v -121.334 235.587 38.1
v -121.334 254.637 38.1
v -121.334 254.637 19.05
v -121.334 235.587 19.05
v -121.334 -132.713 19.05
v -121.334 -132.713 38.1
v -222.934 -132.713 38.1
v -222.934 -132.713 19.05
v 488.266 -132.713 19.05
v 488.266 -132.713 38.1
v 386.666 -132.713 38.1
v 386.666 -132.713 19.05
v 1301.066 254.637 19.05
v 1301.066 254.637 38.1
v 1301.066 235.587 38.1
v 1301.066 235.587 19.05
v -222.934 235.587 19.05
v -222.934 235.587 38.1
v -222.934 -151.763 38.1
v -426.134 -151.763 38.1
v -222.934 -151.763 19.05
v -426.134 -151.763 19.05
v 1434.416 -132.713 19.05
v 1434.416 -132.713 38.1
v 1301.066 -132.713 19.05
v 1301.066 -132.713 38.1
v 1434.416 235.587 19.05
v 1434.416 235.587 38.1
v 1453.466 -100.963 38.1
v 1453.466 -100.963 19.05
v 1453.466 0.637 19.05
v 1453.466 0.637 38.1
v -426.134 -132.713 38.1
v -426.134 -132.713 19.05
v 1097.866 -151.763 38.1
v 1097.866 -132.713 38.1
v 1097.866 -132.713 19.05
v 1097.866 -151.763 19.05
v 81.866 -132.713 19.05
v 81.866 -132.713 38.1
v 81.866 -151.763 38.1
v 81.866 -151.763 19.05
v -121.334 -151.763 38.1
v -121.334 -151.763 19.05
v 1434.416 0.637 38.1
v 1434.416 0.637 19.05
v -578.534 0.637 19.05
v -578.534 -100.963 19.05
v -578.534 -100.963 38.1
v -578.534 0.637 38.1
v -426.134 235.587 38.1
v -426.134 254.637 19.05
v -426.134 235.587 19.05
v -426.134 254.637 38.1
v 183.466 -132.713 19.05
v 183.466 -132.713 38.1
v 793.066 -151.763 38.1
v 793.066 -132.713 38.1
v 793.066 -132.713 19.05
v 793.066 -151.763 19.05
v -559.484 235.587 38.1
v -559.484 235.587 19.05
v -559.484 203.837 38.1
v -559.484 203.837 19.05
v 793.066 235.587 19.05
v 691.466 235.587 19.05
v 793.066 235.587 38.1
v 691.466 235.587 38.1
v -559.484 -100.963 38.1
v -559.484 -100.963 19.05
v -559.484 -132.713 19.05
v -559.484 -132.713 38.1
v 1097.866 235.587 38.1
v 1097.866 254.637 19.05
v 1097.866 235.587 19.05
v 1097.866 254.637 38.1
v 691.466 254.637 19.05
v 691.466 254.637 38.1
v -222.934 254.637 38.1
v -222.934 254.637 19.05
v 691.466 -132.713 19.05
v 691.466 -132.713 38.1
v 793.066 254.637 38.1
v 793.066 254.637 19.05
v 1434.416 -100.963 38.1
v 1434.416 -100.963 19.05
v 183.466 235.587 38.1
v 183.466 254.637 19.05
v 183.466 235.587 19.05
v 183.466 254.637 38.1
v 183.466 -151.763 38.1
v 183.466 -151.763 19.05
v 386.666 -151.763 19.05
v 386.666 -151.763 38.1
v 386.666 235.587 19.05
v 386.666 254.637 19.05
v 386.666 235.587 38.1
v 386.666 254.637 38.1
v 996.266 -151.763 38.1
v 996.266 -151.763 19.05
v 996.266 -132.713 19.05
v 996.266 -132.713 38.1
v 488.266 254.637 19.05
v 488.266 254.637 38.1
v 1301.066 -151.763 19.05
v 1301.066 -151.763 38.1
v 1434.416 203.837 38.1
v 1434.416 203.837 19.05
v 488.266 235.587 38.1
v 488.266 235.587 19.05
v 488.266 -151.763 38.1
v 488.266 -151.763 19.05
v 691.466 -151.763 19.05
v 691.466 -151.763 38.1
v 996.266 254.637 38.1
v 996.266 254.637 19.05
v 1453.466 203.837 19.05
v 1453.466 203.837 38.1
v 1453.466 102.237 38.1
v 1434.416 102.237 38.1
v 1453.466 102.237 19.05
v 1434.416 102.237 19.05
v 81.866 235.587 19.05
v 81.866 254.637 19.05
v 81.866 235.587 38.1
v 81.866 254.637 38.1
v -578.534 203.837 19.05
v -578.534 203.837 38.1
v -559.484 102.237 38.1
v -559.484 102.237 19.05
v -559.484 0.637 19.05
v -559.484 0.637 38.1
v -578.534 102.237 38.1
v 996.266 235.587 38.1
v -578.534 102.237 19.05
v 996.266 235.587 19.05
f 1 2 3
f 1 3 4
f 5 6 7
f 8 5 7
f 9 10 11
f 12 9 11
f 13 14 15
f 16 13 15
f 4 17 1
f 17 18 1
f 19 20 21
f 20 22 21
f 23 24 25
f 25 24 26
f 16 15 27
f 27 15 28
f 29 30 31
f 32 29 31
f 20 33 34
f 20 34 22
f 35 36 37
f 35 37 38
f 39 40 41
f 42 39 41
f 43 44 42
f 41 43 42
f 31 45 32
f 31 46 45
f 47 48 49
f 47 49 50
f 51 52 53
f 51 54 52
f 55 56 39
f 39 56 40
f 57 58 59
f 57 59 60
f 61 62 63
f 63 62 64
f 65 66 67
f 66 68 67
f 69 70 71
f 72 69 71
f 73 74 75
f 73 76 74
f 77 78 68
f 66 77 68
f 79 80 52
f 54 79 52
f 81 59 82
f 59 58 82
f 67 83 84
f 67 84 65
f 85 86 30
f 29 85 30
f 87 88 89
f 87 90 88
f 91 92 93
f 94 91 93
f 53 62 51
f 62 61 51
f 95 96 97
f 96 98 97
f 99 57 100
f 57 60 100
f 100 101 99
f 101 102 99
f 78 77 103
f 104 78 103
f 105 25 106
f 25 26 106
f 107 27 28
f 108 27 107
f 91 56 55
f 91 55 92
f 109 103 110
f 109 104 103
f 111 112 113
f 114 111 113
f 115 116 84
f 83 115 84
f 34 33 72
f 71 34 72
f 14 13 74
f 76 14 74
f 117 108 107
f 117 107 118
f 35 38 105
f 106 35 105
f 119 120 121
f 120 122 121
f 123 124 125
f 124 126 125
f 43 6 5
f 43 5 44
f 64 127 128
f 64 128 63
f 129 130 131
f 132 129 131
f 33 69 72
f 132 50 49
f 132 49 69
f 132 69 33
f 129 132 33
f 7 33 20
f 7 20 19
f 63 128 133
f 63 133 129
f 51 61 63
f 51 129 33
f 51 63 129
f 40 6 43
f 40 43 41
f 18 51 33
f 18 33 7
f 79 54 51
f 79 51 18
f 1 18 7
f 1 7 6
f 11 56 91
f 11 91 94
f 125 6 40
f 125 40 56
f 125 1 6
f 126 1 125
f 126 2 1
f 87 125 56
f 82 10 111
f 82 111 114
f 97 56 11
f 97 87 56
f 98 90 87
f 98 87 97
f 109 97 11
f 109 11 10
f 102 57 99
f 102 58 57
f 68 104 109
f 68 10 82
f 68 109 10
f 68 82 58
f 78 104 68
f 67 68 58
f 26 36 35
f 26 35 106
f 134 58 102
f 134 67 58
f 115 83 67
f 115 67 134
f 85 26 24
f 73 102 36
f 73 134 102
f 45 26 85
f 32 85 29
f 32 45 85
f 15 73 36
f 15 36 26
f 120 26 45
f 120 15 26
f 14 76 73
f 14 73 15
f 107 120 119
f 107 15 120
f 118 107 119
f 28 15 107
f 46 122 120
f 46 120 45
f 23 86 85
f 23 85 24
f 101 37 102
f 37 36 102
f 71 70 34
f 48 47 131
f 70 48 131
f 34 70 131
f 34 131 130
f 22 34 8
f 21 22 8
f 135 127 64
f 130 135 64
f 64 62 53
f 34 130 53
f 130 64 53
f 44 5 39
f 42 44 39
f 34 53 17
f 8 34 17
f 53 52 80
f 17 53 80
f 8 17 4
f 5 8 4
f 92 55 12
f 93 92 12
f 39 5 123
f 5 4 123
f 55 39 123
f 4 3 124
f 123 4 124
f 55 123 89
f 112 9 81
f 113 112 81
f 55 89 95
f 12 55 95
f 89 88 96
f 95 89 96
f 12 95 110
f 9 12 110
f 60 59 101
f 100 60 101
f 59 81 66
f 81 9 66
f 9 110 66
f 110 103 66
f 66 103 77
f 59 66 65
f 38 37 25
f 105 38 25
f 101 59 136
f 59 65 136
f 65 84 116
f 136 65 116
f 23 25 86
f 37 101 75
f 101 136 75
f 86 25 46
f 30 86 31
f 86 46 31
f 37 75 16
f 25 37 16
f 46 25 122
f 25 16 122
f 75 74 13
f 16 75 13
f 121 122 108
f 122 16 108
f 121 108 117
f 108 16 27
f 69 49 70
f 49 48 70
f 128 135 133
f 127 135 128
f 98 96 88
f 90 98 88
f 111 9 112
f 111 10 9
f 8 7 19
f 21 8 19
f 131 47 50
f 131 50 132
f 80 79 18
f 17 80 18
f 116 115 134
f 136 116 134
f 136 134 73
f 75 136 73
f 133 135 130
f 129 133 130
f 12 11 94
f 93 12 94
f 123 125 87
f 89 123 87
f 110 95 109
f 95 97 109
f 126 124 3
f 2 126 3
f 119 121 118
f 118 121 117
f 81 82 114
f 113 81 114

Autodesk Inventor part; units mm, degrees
ref_plane "YZ Plane" through (0, 0, 0) normal (1, 0, 0) x (0, 1, 0)
ref_plane "XZ Plane" through (0, 0, 0) normal (0, 1, 0) x (-1, 0, 0)
ref_plane "XY Plane" through (0, 0, 0) normal (0, 0, 1) x (1, 0, 0)
ref_plane "Work Plane1" through (0, 0, 19.05) normal (0, 0, 1) x (1, 0, 0)
sketch "Sketch2" plane through (0, 0, 19.05) normal (0, 0, 1) x (1, 0, 0)
  line L0 (1453.4656, 254.6366) -> (-578.5344, 254.6366) projected
  line L1 (-578.5344, 254.6366) -> (-559.4844, 254.6366)
  line L2 (-559.4844, -151.7634) -> (-578.5344, -151.7634)
  line L3 (-578.5344, -151.7634) -> (-578.5344, 254.6366)
  line L4 (1453.4656, -151.7634) -> (1453.4656, 254.6366) projected
  line L5 (-578.5344, -151.7634) -> (1453.4656, -151.7634) projected
  line L6 (1453.4656, 254.6366) -> (1434.4156, 254.6366)
  line L7 (1434.4156, -151.7634) -> (1453.4656, -151.7634)
  line L8 (1453.4656, -151.7634) -> (1453.4656, 254.6366)
  line L9 (-578.5344, 254.6366) -> (-578.5344, -151.7634) projected
  line L10 (-559.4844, 254.6366) -> (-559.4844, 203.8366)
  line L11 (-578.5344, 203.8366) -> (-559.4844, 203.8366)
  line L12 (1434.4156, 203.8366) -> (1453.4656, 203.8366)
  line L13 (-578.5344, 102.2366) -> (-559.4844, 102.2366)
  line L14 (1434.4156, 102.2366) -> (1453.4656, 102.2366)
  line L15 (-578.5344, 0.6366) -> (-559.4844, 0.6366)
  line L16 (1434.4156, 0.6366) -> (1453.4656, 0.6366)
  line L17 (-578.5344, -100.9634) -> (-559.4844, -100.9634)
  line L18 (1434.4156, -100.9634) -> (1453.4656, -100.9634)
  line L19 (-559.4844, 102.2366) -> (-559.4844, 0.6366)
  line L20 (-559.4844, -100.9634) -> (-559.4844, -151.7634)
  line L21 (1434.4156, 254.6366) -> (1434.4156, 203.8366)
  line L22 (1434.4156, 102.2366) -> (1434.4156, 0.6366)
  line L23 (1434.4156, -100.9634) -> (1434.4156, -151.7634)
  line L24 (-578.5344, 254.6366) -> (-559.4844, 254.6366)
  line L25 (-559.4844, 254.6366) -> (-559.4844, 203.8366)
  line L26 (-559.4844, 203.8366) -> (-578.5344, 203.8366)
  line L27 (-578.5344, 203.8366) -> (-578.5344, 254.6366)
  line L28 (-578.5344, 102.2366) -> (-559.4844, 102.2366)
  line L29 (-559.4844, 102.2366) -> (-559.4844, 0.6366)
  line L30 (-559.4844, 0.6366) -> (-578.5344, 0.6366)
  line L31 (-578.5344, 0.6366) -> (-578.5344, 102.2366)
  line L32 (-578.5344, -100.9634) -> (-559.4844, -100.9634)
  line L33 (-559.4844, -100.9634) -> (-559.4844, -151.7634)
  line L34 (-559.4844, -151.7634) -> (-578.5344, -151.7634)
  line L35 (-578.5344, -151.7634) -> (-578.5344, -100.9634)
  line L36 (1453.4656, 254.6366) -> (1434.4156, 254.6366)
  line L37 (1434.4156, 254.6366) -> (1434.4156, 203.8366)
  line L38 (1434.4156, 203.8366) -> (1453.4656, 203.8366)
  line L39 (1453.4656, 203.8366) -> (1453.4656, 254.6366)
  line L40 (1453.4656, 102.2366) -> (1434.4156, 102.2366)
  line L41 (1434.4156, 102.2366) -> (1434.4156, 0.6366)
  line L42 (1434.4156, 0.6366) -> (1453.4656, 0.6366)
  line L43 (1453.4656, 0.6366) -> (1453.4656, 102.2366)
  line L44 (1453.4656, -100.9634) -> (1434.4156, -100.9634)
  line L45 (1434.4156, -100.9634) -> (1434.4156, -151.7634)
  line L46 (1434.4156, -151.7634) -> (1453.4656, -151.7634)
  line L47 (1453.4656, -151.7634) -> (1453.4656, -100.9634)
  point P0 (0, 0)
extrude "Extrusion2" add sketch "Sketch2" along normal blind 19.05 contours L21 L12 L4 L14 L22 L16 L18 L23 L5 L20 L17 L3 L15 L19 L13 L11 L10 L0
sketch "Sketch3" plane through (0, 0, 38.1) normal (0, 0, 1) x (1, 0, 0)
  line L0 (1434.4156, 254.6366) -> (-559.4844, 254.6366) projected
  line L1 (1453.4656, 102.2366) -> (1453.4656, 203.8366) projected
  line L2 (-559.4844, -151.7634) -> (1434.4156, -151.7634) projected
  line L3 (-559.4844, 254.6366) -> (-426.1344, 254.6366)
  line L4 (-559.4844, 235.5866) -> (-426.1344, 235.5866)
  line L5 (-222.9344, 254.6366) -> (-121.3344, 254.6366)
  line L6 (-222.9344, 235.5866) -> (-121.3344, 235.5866)
  line L7 (81.8656, 254.6366) -> (183.4656, 254.6366)
  line L8 (81.8656, 235.5866) -> (183.4656, 235.5866)
  line L9 (386.6656, 254.6366) -> (488.2656, 254.6366)
  line L10 (386.6656, 235.5866) -> (488.2656, 235.5866)
  line L11 (691.4656, 254.6366) -> (793.0656, 254.6366)
  line L12 (691.4656, 235.5866) -> (793.0656, 235.5866)
  line L13 (996.2656, 254.6366) -> (1097.8656, 254.6366)
  line L14 (1301.0656, 254.6366) -> (1434.4156, 254.6366)
  line L15 (996.2656, 235.5866) -> (1097.8656, 235.5866)
  line L16 (1301.0656, 235.5866) -> (1434.4156, 235.5866)
  line L17 (1301.0656, 254.6366) -> (1301.0656, 235.5866)
  line L18 (1301.0656, -132.7134) -> (1301.0656, -151.7634)
  line L19 (1097.8656, 254.6366) -> (1097.8656, 235.5866)
  line L20 (1097.8656, -132.7134) -> (1097.8656, -151.7634)
  line L21 (996.2656, 254.6366) -> (996.2656, 235.5866)
  line L22 (996.2656, -132.7134) -> (996.2656, -156.6063)
  line L23 (793.0656, 254.6366) -> (793.0656, 235.5866)
  line L24 (793.0656, -132.7134) -> (793.0656, -151.7634)
  line L25 (691.4656, 254.6366) -> (691.4656, 235.5866)
  line L26 (691.4656, -132.7134) -> (691.4656, -151.7634)
  line L27 (488.2656, 254.6366) -> (488.2656, 235.5866)
  line L28 (488.2656, -132.7134) -> (488.2656, -151.7634)
  line L29 (386.6656, 254.6366) -> (386.6656, 235.5866)
  line L30 (386.6656, -132.7134) -> (386.6656, -151.7634)
  line L31 (183.4656, 254.6366) -> (183.4656, 235.5866)
  line L32 (183.4656, -132.7134) -> (183.4656, -151.7634)
  line L33 (81.8656, 254.6366) -> (81.8656, 235.5866)
  line L34 (81.8656, -132.7134) -> (81.8656, -151.7634)
  line L35 (-121.3344, 254.6366) -> (-121.3344, 235.5866)
  line L36 (-121.3344, -132.7134) -> (-121.3344, -156.6063)
  line L37 (-222.9344, 254.6366) -> (-222.9344, 235.5866)
  line L38 (-222.9344, -132.7134) -> (-222.9344, -151.7634)
  line L39 (-426.1344, 254.6366) -> (-426.1344, 235.5866)
  line L40 (-426.1344, -132.7134) -> (-426.1344, -151.7634)
  line L41 (-426.1344, -132.7134) -> (-559.4844, -132.7134)
  line L42 (-559.4844, -132.7134) -> (-426.1344, -132.7134)
  line L43 (-426.1344, -151.7634) -> (-559.4844, -151.7634)
  line L44 (-121.3344, -132.7134) -> (-222.9344, -132.7134)
  line L45 (-121.3344, -151.7634) -> (-222.9344, -151.7634)
  line L46 (-222.9344, -132.7134) -> (-121.3344, -132.7134)
  line L47 (183.4656, -151.7634) -> (81.8656, -151.7634)
  line L48 (183.4656, -132.7134) -> (81.8656, -132.7134)
  line L49 (81.8656, -132.7134) -> (183.4656, -132.7134)
  line L50 (488.2656, -132.7134) -> (386.6656, -132.7134)
  line L51 (488.2656, -151.7634) -> (386.6656, -151.7634)
  line L52 (386.6656, -132.7134) -> (488.2656, -132.7134)
  line L53 (793.0656, -132.7134) -> (691.4656, -132.7134)
  line L54 (793.0656, -151.7634) -> (691.4656, -151.7634)
  line L55 (691.4656, -132.7134) -> (793.0656, -132.7134)
  line L56 (1434.4156, -132.7134) -> (1301.0656, -132.7134)
  line L57 (1097.8656, -132.7134) -> (996.2656, -132.7134)
  line L58 (1434.4156, -151.7634) -> (1301.0656, -151.7634)
  line L59 (1097.8656, -151.7634) -> (996.2656, -151.7634)
  line L60 (996.2656, -132.7134) -> (1097.8656, -132.7134)
  line L61 (1301.0656, -132.7134) -> (1434.4156, -132.7134)
  line L62 (1434.4156, 254.6366) -> (1434.4156, 235.5866)
  line L63 (1434.4156, -132.7134) -> (1434.4156, -151.7634)
  line L64 (-559.4844, 254.6366) -> (-559.4844, 235.5866)
  line L65 (-559.4844, -132.7134) -> (-559.4844, -151.7634)
  point P0 (0, 0)
  point P1 (1453.4656, -132.7134)
  point P2 (1545.8427, 235.5866)
  point P3 (874.9313, 0)
extrude "Extrusion3" cut sketch "Sketch3" against normal blind 19.05
properties part number "bottom" material "Wood (Birch)"
